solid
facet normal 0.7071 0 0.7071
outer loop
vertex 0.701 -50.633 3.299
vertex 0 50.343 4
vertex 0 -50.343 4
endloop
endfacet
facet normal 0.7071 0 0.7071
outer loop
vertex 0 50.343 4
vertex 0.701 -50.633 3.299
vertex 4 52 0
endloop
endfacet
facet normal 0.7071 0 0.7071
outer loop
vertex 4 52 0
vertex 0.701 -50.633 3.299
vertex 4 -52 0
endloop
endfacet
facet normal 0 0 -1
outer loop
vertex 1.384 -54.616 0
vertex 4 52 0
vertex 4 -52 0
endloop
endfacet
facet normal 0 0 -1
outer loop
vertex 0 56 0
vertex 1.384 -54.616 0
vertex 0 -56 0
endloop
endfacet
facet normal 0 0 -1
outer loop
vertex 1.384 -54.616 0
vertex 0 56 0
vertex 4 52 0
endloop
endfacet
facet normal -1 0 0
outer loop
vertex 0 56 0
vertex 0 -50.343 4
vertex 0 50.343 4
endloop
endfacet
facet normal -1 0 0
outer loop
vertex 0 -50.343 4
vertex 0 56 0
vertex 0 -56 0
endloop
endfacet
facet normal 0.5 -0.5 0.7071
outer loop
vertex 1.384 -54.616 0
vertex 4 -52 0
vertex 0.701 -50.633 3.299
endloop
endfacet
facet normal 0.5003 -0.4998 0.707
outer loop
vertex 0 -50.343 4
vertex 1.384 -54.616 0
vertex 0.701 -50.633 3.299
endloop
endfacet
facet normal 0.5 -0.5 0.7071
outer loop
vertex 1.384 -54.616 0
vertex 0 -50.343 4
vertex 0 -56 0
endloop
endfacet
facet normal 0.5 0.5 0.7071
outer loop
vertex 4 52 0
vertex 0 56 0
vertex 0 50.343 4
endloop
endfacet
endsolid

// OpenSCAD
roueWidth = 5;
roueDiameter = 40;
roueProfondeurL = 4;
roueDiamTroue = 1.55;
roueLateralThick = 3;

jointLargeur = 7;
jointLongeur = 17;
jointHoleEdge=4;

chassisThick = 3;



module  joint()
{
    color("#065535")
    linear_extrude(chassisThick)
    difference() {
        square([jointLargeur,jointLongeur],center=true);
        translate([0,jointLongeur*0.5 -jointHoleEdge,0]) circle(roueDiamTroue,$fn=150);   
        translate([0,-jointLongeur*0.5+jointHoleEdge,0]) circle(roueDiamTroue,$fn=150);     
     }
}

module joints()
{
    joint();
    translate([0,40,0]) joint();
    translate([30,40,0]) joint();
    translate([40,0,0]) joint();
    translate([60,40,0]) joint();
    translate([70,0,0]) joint();
}


// joint();

//joints();


triangleLength = 60;
trinagleHoleEdgeL = triangleLength/8;

module triangle()
    {
      translate([-chassisThick*0.5,0,0])
      rotate([0,90,0])
      linear_extrude(chassisThick)
      difference()
        {       
         polygon([[0,triangleLength],[0,-triangleLength],[triangleLength,0]]);
         translate([triangleLength*0.5+trinagleHoleEdgeL*2,0,0]) circle(roueDiamTroue, $fn=150);
         translate([trinagleHoleEdgeL,triangleLength*0.5+trinagleHoleEdgeL,0]) circle(roueDiamTroue, $fn=150);  
         translate([trinagleHoleEdgeL,-triangleLength*0.5-trinagleHoleEdgeL,0]) circle(roueDiamTroue, $fn=150);     
        }
    
}
    

//triangle();  

module roue()
{
   rotate_extrude(angle = 360,convexity = 20,$fn=300)
    translate([(roueDiameter/4)+ roueDiamTroue *0.5+roueDiamTroue-0.55 ,17,0])    
        rotate([0,0,-90])
            difference(){
            square([roueWidth,roueDiameter*0.5],center = true);
            translate([0,roueDiameter*0.5 - roueProfondeurL ,0]) 
                square([roueWidth-roueLateralThick,roueDiameter*0.5],center = true);
    }
}

//roue();


module renforcement1() {
        #translate([-0,-triangleLength,-chassisThick]) rotate([-90,0,0]) linear_extrude(2*triangleLength)
    difference() {
        square(chassisThick,center=true);
        translate([2,2,0]) circle(chassisThick,$fn=150); 
     
     translate([-2,-2,0])circle(chassisThick,$fn=150);  
    }
}


//renforcement1();

    
module chassis()
{   
  translate([-triangleLength*0.5+chassisThick*0.5,0,-chassisThick*0.5]) triangle();
  translate([triangleLength*0.5 - chassisThick*0.5 ,0,-chassisThick*0.5]) triangle();
  cube([triangleLength,triangleLength*2,chassisThick], center =true);
        
}

//chassis();


module assembledRobot() {
    chassis();
    translate([-37,0,-42]) rotate([90,0,90])  joint();
    translate([37,0,-42]) rotate([90,0,90])  joint();
    translate([-37,38,-4]) rotate([90,0,90])  joint();
    translate([37,38,-4]) rotate([90,0,90])  joint();
    translate([37,-38,-4]) rotate([90,0,90])  joint();
    translate([-37,-38,-4]) rotate([90,0,90])  joint();

    translate([1,0,-46.5]) rotate([90,0,90]) color("#09bfb8") cylinder(82,1.5,1.5 ,center = true, $fn = 150);
    translate([1,38,-9]) rotate([90,0,90]) color("#09bfb8") cylinder(82,1.5,1.5 ,center = true, $fn = 150);
    translate([1,-38,-9]) rotate([90,0,90]) color("#09bfb8") cylinder(82,1.5,1.5 ,center = true, $fn = 150);

   // translate([-50,0,0])  triangle();
//    translate([50,0,0]) triangle();
    translate([0,0,-47]) rotate([90,0,90]) color("#aa6800") roue();
 }


//assembledRobot();
 
 
  
module renforcement()
{    difference(){
        rotate([90,0,0]) translate([0,0,-triangleLength])  linear_extrude(triangleLength*2)
           polygon([[0,0],[0,chassisThick+1],[chassisThick+1,0]]);
          translate([3,-triangleLength+2,0]) rotate([-45,0,45]) cube([10,5,20],center = true);
          translate([3,triangleLength-2,0]) rotate([45,0,-45]) cube([21,5,22],center = true);      
    }

}

renforcement();
